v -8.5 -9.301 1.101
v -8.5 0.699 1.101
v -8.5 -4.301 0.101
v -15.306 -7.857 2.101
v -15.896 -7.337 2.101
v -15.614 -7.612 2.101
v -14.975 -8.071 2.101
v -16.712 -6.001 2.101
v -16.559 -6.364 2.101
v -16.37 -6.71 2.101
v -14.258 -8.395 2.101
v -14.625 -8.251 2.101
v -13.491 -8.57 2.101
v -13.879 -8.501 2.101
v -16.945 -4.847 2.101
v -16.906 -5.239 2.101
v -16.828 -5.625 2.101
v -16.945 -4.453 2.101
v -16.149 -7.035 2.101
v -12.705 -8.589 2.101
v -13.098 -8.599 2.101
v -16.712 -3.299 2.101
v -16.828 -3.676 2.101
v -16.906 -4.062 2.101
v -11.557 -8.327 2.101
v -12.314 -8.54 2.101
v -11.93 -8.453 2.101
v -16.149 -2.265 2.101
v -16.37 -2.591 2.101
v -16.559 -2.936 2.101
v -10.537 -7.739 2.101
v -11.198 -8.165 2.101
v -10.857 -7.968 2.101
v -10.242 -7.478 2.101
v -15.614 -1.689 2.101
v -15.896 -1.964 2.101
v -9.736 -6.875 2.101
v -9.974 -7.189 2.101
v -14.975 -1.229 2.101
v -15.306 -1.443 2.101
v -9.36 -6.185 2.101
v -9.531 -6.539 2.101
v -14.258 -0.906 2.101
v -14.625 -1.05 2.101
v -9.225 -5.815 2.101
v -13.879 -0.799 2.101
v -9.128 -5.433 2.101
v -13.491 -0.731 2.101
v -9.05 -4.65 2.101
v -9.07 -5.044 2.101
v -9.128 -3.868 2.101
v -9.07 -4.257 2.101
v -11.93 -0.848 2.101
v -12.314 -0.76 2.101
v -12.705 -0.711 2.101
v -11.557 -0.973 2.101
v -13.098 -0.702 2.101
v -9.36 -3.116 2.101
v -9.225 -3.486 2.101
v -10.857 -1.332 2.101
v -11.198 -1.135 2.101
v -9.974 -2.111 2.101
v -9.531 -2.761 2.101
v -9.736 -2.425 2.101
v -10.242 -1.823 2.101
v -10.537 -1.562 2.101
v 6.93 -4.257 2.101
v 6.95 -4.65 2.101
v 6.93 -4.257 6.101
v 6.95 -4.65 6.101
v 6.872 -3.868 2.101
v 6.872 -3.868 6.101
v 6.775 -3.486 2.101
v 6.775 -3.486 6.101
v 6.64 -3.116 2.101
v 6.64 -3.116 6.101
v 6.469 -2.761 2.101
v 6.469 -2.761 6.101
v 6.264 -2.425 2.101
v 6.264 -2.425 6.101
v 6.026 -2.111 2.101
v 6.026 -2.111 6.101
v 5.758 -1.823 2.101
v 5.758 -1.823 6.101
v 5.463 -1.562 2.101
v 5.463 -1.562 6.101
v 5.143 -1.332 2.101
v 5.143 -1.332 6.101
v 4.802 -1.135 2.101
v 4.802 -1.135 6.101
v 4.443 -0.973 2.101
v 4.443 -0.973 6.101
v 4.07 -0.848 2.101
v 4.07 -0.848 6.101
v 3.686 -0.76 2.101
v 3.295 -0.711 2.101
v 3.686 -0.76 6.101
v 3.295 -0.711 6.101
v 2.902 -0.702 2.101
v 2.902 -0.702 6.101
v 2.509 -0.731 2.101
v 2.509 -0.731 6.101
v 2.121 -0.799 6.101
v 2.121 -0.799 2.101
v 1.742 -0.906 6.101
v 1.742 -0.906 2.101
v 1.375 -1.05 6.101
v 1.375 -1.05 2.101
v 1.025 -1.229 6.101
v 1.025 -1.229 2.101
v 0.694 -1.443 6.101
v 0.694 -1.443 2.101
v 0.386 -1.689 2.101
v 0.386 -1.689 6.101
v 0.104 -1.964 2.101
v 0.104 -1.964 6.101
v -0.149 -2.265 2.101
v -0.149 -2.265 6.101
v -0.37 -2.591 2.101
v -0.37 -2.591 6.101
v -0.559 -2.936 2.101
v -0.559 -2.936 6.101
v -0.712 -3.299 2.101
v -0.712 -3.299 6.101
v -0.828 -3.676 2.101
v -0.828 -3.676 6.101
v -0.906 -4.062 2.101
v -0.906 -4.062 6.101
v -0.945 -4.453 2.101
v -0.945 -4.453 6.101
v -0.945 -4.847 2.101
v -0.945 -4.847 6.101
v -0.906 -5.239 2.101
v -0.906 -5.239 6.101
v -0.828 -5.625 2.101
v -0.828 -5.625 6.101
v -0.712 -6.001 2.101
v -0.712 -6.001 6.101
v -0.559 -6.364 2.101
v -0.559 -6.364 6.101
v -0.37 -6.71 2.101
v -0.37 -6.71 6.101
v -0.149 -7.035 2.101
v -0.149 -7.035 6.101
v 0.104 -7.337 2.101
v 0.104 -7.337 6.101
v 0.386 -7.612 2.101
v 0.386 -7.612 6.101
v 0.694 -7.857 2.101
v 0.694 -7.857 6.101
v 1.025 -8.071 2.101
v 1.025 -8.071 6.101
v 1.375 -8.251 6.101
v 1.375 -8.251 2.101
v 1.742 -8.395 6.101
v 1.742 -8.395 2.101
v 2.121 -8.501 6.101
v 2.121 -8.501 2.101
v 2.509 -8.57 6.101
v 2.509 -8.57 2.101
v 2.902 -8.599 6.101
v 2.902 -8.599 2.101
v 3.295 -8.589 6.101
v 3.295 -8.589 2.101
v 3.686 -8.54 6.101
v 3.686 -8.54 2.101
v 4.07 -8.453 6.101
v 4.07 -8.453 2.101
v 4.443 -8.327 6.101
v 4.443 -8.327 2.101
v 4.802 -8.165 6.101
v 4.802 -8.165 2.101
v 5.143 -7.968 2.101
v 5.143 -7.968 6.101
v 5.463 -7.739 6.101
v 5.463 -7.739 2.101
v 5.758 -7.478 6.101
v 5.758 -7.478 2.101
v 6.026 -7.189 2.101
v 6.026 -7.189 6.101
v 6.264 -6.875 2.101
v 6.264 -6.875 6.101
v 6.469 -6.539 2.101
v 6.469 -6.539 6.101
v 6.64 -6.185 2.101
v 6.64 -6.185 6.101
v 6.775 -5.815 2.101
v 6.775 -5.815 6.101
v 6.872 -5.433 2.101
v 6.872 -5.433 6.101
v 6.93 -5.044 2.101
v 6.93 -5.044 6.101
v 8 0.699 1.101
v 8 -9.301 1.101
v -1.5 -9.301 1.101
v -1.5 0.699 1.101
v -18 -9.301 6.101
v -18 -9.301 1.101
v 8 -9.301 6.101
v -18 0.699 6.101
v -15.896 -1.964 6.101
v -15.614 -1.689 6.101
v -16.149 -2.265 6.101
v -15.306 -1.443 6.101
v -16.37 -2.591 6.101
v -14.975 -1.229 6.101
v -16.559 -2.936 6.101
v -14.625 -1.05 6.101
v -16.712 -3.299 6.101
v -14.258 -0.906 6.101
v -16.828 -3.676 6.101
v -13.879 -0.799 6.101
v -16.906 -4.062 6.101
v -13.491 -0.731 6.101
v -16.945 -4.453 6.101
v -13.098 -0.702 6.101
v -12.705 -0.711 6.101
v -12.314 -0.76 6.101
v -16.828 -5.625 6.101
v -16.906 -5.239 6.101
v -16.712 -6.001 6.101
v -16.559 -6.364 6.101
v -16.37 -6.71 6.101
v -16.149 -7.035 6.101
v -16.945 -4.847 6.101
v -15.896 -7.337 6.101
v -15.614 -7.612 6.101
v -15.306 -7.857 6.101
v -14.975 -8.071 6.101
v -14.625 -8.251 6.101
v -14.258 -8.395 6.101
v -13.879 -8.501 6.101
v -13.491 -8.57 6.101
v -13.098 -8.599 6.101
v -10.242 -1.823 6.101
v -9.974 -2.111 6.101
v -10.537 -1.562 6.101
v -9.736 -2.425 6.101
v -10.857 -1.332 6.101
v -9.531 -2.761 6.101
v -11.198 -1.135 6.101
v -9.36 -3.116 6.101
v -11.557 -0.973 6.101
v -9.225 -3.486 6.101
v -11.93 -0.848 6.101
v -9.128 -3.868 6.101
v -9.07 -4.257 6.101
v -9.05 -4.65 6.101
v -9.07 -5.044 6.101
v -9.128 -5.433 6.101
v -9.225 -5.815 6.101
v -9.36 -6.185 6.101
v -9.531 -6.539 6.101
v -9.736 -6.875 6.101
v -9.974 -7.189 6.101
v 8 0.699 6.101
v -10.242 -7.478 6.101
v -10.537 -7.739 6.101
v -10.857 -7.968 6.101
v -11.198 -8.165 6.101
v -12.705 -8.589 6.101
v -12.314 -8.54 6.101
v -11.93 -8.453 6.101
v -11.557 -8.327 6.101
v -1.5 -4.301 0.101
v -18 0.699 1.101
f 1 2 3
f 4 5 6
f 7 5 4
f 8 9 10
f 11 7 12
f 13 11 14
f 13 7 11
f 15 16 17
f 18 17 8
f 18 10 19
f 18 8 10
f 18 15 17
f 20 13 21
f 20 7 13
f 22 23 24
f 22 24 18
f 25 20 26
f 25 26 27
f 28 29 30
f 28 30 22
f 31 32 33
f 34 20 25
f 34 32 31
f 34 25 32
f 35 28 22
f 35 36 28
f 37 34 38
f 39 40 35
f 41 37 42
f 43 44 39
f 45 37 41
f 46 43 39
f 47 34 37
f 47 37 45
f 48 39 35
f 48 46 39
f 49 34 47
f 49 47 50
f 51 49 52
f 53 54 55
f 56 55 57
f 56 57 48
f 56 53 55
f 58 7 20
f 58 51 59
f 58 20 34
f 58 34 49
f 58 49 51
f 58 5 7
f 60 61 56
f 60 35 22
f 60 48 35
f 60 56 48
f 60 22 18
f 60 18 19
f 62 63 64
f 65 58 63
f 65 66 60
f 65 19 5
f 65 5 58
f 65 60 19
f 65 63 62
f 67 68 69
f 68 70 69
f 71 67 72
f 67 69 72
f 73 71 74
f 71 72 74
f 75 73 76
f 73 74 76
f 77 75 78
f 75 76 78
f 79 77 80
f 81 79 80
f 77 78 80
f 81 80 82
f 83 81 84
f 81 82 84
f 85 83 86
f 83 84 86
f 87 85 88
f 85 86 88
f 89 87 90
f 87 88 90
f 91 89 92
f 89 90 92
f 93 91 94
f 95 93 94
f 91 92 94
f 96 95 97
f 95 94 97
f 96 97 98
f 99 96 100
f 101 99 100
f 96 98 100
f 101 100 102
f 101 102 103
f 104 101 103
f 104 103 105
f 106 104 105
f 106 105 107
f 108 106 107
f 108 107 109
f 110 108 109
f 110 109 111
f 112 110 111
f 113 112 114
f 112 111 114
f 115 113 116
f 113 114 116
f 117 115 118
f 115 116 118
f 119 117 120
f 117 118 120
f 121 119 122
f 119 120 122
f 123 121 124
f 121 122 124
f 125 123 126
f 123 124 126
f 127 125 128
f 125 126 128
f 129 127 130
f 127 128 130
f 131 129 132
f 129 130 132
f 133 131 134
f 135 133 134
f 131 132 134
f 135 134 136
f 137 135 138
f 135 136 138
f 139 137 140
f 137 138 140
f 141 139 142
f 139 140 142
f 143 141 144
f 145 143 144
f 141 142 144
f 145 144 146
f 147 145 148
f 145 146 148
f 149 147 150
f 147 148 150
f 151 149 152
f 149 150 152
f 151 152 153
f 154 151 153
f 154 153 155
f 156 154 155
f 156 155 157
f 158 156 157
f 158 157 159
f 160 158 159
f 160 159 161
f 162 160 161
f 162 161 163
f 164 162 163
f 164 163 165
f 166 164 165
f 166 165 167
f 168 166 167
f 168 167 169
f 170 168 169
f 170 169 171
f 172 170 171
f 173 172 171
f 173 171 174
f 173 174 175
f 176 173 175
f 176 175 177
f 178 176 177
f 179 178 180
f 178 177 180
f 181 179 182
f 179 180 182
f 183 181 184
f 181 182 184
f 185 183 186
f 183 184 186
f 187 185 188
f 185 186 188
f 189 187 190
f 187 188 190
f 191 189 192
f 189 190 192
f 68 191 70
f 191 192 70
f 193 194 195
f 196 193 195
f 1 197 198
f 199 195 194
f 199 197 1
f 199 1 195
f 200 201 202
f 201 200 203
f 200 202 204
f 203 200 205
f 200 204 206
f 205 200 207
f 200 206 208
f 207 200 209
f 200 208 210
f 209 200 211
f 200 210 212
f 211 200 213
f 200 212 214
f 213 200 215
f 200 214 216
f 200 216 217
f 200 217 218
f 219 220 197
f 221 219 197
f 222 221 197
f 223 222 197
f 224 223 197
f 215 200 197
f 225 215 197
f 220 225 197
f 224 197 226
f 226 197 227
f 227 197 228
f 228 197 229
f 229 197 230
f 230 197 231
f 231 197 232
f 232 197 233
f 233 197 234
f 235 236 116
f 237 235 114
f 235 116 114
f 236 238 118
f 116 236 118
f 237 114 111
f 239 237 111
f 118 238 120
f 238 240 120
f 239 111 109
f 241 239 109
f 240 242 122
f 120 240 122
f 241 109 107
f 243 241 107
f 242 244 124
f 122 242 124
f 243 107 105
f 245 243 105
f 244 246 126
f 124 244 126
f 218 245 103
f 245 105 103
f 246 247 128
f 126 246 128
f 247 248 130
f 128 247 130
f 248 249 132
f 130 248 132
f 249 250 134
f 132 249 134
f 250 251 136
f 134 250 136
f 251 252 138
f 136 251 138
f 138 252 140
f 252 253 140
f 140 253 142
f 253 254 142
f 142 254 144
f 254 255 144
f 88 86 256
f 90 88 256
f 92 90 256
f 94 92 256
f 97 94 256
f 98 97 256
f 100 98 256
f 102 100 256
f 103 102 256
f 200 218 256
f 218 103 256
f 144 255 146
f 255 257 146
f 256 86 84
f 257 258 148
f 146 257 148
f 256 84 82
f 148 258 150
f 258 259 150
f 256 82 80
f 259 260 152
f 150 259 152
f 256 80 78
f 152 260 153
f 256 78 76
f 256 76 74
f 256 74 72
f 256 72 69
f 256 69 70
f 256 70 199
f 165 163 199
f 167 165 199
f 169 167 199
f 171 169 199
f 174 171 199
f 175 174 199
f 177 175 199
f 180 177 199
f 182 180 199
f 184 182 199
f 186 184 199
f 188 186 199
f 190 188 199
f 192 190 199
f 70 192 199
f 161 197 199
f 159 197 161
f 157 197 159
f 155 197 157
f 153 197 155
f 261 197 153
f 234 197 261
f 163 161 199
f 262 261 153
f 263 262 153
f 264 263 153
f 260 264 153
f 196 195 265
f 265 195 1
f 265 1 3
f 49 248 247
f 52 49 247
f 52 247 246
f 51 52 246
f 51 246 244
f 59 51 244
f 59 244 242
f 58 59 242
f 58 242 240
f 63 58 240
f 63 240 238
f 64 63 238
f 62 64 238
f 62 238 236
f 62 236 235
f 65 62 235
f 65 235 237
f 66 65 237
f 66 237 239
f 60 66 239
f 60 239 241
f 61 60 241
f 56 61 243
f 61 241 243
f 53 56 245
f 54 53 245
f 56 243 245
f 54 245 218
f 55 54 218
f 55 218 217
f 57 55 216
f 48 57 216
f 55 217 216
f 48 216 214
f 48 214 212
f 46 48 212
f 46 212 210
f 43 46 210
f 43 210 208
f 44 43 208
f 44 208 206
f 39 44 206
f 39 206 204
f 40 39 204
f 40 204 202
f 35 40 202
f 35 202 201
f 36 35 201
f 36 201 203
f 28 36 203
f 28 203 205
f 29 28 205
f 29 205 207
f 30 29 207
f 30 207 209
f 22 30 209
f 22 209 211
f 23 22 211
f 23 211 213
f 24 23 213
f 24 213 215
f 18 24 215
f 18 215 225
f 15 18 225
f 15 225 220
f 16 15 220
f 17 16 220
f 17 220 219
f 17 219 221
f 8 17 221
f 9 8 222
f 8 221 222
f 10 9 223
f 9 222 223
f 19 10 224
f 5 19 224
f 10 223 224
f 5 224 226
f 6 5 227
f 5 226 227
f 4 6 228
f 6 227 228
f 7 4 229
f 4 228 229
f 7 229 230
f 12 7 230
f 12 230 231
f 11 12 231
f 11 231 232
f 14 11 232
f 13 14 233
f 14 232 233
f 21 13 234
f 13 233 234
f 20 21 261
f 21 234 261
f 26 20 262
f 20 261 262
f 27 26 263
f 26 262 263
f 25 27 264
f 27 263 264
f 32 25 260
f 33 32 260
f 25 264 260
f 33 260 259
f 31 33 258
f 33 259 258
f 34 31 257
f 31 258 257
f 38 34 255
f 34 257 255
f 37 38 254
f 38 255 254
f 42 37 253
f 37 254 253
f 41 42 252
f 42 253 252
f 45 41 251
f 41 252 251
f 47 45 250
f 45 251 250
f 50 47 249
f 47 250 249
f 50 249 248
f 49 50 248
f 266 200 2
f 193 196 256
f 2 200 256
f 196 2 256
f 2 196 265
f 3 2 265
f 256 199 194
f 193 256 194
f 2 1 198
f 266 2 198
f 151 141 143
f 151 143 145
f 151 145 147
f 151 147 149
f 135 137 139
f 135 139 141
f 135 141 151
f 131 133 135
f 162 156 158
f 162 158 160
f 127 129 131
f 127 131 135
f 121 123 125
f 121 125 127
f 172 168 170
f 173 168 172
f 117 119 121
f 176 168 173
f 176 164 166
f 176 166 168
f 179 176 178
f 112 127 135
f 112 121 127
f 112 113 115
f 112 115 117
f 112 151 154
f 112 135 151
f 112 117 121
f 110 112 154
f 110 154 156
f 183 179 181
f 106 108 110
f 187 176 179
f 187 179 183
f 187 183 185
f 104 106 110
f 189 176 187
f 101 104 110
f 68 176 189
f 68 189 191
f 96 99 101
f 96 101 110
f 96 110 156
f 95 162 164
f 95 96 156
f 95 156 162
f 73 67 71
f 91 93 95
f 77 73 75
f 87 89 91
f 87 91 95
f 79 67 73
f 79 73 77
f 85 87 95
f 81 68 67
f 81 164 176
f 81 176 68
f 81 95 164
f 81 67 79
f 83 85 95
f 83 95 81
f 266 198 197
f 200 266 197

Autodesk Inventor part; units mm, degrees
ref_plane "YZ Plane" through (0, 0, 0) normal (1, 0, 0) x (0, 1, 0)
ref_plane "XZ Plane" through (0, 0, 0) normal (0, 1, 0) x (-1, 0, 0)
ref_plane "XY Plane" through (0, 0, 0) normal (0, 0, 1) x (1, 0, 0)
ref_plane "Work Plane1" through (0, -9.3006, 0) normal (0, -1, 0) x (1, 0, 0)
sketch "Sketch1" plane through (0, -9.3006, 0) normal (0, -1, 0) x (1, 0, 0)
  line L0 (8, -4.5373) -> (-18, -4.5373) projected
  line L1 (8, 0) -> (8, -4.5373) projected
  line L2 (8, 0) -> (-18, 0) projected
  line L3 (-18, -4.5373) -> (-18, 0) projected
  line L4 (-18, 6.1006) -> (8, 6.1006)
  line L5 (8, 6.1006) -> (8, 1.1006)
  line L6 (8, 1.1006) -> (-18, 1.1006)
  line L7 (-18, 1.1006) -> (-18, 6.1006)
  line L8 (-8.5, 0.1006) -> (-1.5, 0.1006)
  line L9 (-1.5, 0.1006) -> (-1.5, 1.1006)
  line L10 (-1.5, 1.1006) -> (-8.5, 1.1006)
  line L11 (-8.5, 1.1006) -> (-8.5, 0.1006)
  line L12 (-8.5, 0.1006) -> (-1.5, 1.1006) construction
  line L13 (-1.5, 0.1006) -> (-8.5, 1.1006) construction
  point P0 (0, 0)
  point P1 (-5, 0.6006)
  dimension "d0" = 5
  dimension "d1" = 7
  dimension "d2" = 1
  dimension "d3" = 0
extrude "Extrusion1" add sketch "Sketch1" against normal blind 10 contours L4 L5 L6 L7 | L6 L9 L8 L11
sketch "Sketch2" plane through (-18, -9.3006, 6.1006) normal (0, 0, 1) x (1, 0, 0)
  circle A0 centre (5, 4.6503) radius 3.95 projected
  circle A1 centre (21, 4.6503) radius 3.95 projected
  point P0 (18, 9.3006)
extrude "Extrusion2" cut sketch "Sketch2" against normal blind 4
sketch "Sketch3" plane through (8, -9.3006, 6.1006) normal (1, 0, 0) x (0, 0, -1)
  line L0 (6, 0) -> (5, 0) projected
  line L1 (6, 0) -> (6, 10) projected
  line L2 (5, 10) -> (6, 10) projected
  line L3 (5, 0) -> (5, 10) construction
  line L4 (5, 0) -> (6, 5)
  line L5 (6, 0) -> (6, 10) projected
  line L6 (5, 0) -> (5, 10) construction
  line L7 (5, 10) -> (6, 5)
  point P0 (6.1006, 9.3006)
extrude "Extrusion3" cut sketch "Sketch3" against normal through all
properties part number "20_Cube_Insert_Felxuremanipulator_zonly_fiberlid"
